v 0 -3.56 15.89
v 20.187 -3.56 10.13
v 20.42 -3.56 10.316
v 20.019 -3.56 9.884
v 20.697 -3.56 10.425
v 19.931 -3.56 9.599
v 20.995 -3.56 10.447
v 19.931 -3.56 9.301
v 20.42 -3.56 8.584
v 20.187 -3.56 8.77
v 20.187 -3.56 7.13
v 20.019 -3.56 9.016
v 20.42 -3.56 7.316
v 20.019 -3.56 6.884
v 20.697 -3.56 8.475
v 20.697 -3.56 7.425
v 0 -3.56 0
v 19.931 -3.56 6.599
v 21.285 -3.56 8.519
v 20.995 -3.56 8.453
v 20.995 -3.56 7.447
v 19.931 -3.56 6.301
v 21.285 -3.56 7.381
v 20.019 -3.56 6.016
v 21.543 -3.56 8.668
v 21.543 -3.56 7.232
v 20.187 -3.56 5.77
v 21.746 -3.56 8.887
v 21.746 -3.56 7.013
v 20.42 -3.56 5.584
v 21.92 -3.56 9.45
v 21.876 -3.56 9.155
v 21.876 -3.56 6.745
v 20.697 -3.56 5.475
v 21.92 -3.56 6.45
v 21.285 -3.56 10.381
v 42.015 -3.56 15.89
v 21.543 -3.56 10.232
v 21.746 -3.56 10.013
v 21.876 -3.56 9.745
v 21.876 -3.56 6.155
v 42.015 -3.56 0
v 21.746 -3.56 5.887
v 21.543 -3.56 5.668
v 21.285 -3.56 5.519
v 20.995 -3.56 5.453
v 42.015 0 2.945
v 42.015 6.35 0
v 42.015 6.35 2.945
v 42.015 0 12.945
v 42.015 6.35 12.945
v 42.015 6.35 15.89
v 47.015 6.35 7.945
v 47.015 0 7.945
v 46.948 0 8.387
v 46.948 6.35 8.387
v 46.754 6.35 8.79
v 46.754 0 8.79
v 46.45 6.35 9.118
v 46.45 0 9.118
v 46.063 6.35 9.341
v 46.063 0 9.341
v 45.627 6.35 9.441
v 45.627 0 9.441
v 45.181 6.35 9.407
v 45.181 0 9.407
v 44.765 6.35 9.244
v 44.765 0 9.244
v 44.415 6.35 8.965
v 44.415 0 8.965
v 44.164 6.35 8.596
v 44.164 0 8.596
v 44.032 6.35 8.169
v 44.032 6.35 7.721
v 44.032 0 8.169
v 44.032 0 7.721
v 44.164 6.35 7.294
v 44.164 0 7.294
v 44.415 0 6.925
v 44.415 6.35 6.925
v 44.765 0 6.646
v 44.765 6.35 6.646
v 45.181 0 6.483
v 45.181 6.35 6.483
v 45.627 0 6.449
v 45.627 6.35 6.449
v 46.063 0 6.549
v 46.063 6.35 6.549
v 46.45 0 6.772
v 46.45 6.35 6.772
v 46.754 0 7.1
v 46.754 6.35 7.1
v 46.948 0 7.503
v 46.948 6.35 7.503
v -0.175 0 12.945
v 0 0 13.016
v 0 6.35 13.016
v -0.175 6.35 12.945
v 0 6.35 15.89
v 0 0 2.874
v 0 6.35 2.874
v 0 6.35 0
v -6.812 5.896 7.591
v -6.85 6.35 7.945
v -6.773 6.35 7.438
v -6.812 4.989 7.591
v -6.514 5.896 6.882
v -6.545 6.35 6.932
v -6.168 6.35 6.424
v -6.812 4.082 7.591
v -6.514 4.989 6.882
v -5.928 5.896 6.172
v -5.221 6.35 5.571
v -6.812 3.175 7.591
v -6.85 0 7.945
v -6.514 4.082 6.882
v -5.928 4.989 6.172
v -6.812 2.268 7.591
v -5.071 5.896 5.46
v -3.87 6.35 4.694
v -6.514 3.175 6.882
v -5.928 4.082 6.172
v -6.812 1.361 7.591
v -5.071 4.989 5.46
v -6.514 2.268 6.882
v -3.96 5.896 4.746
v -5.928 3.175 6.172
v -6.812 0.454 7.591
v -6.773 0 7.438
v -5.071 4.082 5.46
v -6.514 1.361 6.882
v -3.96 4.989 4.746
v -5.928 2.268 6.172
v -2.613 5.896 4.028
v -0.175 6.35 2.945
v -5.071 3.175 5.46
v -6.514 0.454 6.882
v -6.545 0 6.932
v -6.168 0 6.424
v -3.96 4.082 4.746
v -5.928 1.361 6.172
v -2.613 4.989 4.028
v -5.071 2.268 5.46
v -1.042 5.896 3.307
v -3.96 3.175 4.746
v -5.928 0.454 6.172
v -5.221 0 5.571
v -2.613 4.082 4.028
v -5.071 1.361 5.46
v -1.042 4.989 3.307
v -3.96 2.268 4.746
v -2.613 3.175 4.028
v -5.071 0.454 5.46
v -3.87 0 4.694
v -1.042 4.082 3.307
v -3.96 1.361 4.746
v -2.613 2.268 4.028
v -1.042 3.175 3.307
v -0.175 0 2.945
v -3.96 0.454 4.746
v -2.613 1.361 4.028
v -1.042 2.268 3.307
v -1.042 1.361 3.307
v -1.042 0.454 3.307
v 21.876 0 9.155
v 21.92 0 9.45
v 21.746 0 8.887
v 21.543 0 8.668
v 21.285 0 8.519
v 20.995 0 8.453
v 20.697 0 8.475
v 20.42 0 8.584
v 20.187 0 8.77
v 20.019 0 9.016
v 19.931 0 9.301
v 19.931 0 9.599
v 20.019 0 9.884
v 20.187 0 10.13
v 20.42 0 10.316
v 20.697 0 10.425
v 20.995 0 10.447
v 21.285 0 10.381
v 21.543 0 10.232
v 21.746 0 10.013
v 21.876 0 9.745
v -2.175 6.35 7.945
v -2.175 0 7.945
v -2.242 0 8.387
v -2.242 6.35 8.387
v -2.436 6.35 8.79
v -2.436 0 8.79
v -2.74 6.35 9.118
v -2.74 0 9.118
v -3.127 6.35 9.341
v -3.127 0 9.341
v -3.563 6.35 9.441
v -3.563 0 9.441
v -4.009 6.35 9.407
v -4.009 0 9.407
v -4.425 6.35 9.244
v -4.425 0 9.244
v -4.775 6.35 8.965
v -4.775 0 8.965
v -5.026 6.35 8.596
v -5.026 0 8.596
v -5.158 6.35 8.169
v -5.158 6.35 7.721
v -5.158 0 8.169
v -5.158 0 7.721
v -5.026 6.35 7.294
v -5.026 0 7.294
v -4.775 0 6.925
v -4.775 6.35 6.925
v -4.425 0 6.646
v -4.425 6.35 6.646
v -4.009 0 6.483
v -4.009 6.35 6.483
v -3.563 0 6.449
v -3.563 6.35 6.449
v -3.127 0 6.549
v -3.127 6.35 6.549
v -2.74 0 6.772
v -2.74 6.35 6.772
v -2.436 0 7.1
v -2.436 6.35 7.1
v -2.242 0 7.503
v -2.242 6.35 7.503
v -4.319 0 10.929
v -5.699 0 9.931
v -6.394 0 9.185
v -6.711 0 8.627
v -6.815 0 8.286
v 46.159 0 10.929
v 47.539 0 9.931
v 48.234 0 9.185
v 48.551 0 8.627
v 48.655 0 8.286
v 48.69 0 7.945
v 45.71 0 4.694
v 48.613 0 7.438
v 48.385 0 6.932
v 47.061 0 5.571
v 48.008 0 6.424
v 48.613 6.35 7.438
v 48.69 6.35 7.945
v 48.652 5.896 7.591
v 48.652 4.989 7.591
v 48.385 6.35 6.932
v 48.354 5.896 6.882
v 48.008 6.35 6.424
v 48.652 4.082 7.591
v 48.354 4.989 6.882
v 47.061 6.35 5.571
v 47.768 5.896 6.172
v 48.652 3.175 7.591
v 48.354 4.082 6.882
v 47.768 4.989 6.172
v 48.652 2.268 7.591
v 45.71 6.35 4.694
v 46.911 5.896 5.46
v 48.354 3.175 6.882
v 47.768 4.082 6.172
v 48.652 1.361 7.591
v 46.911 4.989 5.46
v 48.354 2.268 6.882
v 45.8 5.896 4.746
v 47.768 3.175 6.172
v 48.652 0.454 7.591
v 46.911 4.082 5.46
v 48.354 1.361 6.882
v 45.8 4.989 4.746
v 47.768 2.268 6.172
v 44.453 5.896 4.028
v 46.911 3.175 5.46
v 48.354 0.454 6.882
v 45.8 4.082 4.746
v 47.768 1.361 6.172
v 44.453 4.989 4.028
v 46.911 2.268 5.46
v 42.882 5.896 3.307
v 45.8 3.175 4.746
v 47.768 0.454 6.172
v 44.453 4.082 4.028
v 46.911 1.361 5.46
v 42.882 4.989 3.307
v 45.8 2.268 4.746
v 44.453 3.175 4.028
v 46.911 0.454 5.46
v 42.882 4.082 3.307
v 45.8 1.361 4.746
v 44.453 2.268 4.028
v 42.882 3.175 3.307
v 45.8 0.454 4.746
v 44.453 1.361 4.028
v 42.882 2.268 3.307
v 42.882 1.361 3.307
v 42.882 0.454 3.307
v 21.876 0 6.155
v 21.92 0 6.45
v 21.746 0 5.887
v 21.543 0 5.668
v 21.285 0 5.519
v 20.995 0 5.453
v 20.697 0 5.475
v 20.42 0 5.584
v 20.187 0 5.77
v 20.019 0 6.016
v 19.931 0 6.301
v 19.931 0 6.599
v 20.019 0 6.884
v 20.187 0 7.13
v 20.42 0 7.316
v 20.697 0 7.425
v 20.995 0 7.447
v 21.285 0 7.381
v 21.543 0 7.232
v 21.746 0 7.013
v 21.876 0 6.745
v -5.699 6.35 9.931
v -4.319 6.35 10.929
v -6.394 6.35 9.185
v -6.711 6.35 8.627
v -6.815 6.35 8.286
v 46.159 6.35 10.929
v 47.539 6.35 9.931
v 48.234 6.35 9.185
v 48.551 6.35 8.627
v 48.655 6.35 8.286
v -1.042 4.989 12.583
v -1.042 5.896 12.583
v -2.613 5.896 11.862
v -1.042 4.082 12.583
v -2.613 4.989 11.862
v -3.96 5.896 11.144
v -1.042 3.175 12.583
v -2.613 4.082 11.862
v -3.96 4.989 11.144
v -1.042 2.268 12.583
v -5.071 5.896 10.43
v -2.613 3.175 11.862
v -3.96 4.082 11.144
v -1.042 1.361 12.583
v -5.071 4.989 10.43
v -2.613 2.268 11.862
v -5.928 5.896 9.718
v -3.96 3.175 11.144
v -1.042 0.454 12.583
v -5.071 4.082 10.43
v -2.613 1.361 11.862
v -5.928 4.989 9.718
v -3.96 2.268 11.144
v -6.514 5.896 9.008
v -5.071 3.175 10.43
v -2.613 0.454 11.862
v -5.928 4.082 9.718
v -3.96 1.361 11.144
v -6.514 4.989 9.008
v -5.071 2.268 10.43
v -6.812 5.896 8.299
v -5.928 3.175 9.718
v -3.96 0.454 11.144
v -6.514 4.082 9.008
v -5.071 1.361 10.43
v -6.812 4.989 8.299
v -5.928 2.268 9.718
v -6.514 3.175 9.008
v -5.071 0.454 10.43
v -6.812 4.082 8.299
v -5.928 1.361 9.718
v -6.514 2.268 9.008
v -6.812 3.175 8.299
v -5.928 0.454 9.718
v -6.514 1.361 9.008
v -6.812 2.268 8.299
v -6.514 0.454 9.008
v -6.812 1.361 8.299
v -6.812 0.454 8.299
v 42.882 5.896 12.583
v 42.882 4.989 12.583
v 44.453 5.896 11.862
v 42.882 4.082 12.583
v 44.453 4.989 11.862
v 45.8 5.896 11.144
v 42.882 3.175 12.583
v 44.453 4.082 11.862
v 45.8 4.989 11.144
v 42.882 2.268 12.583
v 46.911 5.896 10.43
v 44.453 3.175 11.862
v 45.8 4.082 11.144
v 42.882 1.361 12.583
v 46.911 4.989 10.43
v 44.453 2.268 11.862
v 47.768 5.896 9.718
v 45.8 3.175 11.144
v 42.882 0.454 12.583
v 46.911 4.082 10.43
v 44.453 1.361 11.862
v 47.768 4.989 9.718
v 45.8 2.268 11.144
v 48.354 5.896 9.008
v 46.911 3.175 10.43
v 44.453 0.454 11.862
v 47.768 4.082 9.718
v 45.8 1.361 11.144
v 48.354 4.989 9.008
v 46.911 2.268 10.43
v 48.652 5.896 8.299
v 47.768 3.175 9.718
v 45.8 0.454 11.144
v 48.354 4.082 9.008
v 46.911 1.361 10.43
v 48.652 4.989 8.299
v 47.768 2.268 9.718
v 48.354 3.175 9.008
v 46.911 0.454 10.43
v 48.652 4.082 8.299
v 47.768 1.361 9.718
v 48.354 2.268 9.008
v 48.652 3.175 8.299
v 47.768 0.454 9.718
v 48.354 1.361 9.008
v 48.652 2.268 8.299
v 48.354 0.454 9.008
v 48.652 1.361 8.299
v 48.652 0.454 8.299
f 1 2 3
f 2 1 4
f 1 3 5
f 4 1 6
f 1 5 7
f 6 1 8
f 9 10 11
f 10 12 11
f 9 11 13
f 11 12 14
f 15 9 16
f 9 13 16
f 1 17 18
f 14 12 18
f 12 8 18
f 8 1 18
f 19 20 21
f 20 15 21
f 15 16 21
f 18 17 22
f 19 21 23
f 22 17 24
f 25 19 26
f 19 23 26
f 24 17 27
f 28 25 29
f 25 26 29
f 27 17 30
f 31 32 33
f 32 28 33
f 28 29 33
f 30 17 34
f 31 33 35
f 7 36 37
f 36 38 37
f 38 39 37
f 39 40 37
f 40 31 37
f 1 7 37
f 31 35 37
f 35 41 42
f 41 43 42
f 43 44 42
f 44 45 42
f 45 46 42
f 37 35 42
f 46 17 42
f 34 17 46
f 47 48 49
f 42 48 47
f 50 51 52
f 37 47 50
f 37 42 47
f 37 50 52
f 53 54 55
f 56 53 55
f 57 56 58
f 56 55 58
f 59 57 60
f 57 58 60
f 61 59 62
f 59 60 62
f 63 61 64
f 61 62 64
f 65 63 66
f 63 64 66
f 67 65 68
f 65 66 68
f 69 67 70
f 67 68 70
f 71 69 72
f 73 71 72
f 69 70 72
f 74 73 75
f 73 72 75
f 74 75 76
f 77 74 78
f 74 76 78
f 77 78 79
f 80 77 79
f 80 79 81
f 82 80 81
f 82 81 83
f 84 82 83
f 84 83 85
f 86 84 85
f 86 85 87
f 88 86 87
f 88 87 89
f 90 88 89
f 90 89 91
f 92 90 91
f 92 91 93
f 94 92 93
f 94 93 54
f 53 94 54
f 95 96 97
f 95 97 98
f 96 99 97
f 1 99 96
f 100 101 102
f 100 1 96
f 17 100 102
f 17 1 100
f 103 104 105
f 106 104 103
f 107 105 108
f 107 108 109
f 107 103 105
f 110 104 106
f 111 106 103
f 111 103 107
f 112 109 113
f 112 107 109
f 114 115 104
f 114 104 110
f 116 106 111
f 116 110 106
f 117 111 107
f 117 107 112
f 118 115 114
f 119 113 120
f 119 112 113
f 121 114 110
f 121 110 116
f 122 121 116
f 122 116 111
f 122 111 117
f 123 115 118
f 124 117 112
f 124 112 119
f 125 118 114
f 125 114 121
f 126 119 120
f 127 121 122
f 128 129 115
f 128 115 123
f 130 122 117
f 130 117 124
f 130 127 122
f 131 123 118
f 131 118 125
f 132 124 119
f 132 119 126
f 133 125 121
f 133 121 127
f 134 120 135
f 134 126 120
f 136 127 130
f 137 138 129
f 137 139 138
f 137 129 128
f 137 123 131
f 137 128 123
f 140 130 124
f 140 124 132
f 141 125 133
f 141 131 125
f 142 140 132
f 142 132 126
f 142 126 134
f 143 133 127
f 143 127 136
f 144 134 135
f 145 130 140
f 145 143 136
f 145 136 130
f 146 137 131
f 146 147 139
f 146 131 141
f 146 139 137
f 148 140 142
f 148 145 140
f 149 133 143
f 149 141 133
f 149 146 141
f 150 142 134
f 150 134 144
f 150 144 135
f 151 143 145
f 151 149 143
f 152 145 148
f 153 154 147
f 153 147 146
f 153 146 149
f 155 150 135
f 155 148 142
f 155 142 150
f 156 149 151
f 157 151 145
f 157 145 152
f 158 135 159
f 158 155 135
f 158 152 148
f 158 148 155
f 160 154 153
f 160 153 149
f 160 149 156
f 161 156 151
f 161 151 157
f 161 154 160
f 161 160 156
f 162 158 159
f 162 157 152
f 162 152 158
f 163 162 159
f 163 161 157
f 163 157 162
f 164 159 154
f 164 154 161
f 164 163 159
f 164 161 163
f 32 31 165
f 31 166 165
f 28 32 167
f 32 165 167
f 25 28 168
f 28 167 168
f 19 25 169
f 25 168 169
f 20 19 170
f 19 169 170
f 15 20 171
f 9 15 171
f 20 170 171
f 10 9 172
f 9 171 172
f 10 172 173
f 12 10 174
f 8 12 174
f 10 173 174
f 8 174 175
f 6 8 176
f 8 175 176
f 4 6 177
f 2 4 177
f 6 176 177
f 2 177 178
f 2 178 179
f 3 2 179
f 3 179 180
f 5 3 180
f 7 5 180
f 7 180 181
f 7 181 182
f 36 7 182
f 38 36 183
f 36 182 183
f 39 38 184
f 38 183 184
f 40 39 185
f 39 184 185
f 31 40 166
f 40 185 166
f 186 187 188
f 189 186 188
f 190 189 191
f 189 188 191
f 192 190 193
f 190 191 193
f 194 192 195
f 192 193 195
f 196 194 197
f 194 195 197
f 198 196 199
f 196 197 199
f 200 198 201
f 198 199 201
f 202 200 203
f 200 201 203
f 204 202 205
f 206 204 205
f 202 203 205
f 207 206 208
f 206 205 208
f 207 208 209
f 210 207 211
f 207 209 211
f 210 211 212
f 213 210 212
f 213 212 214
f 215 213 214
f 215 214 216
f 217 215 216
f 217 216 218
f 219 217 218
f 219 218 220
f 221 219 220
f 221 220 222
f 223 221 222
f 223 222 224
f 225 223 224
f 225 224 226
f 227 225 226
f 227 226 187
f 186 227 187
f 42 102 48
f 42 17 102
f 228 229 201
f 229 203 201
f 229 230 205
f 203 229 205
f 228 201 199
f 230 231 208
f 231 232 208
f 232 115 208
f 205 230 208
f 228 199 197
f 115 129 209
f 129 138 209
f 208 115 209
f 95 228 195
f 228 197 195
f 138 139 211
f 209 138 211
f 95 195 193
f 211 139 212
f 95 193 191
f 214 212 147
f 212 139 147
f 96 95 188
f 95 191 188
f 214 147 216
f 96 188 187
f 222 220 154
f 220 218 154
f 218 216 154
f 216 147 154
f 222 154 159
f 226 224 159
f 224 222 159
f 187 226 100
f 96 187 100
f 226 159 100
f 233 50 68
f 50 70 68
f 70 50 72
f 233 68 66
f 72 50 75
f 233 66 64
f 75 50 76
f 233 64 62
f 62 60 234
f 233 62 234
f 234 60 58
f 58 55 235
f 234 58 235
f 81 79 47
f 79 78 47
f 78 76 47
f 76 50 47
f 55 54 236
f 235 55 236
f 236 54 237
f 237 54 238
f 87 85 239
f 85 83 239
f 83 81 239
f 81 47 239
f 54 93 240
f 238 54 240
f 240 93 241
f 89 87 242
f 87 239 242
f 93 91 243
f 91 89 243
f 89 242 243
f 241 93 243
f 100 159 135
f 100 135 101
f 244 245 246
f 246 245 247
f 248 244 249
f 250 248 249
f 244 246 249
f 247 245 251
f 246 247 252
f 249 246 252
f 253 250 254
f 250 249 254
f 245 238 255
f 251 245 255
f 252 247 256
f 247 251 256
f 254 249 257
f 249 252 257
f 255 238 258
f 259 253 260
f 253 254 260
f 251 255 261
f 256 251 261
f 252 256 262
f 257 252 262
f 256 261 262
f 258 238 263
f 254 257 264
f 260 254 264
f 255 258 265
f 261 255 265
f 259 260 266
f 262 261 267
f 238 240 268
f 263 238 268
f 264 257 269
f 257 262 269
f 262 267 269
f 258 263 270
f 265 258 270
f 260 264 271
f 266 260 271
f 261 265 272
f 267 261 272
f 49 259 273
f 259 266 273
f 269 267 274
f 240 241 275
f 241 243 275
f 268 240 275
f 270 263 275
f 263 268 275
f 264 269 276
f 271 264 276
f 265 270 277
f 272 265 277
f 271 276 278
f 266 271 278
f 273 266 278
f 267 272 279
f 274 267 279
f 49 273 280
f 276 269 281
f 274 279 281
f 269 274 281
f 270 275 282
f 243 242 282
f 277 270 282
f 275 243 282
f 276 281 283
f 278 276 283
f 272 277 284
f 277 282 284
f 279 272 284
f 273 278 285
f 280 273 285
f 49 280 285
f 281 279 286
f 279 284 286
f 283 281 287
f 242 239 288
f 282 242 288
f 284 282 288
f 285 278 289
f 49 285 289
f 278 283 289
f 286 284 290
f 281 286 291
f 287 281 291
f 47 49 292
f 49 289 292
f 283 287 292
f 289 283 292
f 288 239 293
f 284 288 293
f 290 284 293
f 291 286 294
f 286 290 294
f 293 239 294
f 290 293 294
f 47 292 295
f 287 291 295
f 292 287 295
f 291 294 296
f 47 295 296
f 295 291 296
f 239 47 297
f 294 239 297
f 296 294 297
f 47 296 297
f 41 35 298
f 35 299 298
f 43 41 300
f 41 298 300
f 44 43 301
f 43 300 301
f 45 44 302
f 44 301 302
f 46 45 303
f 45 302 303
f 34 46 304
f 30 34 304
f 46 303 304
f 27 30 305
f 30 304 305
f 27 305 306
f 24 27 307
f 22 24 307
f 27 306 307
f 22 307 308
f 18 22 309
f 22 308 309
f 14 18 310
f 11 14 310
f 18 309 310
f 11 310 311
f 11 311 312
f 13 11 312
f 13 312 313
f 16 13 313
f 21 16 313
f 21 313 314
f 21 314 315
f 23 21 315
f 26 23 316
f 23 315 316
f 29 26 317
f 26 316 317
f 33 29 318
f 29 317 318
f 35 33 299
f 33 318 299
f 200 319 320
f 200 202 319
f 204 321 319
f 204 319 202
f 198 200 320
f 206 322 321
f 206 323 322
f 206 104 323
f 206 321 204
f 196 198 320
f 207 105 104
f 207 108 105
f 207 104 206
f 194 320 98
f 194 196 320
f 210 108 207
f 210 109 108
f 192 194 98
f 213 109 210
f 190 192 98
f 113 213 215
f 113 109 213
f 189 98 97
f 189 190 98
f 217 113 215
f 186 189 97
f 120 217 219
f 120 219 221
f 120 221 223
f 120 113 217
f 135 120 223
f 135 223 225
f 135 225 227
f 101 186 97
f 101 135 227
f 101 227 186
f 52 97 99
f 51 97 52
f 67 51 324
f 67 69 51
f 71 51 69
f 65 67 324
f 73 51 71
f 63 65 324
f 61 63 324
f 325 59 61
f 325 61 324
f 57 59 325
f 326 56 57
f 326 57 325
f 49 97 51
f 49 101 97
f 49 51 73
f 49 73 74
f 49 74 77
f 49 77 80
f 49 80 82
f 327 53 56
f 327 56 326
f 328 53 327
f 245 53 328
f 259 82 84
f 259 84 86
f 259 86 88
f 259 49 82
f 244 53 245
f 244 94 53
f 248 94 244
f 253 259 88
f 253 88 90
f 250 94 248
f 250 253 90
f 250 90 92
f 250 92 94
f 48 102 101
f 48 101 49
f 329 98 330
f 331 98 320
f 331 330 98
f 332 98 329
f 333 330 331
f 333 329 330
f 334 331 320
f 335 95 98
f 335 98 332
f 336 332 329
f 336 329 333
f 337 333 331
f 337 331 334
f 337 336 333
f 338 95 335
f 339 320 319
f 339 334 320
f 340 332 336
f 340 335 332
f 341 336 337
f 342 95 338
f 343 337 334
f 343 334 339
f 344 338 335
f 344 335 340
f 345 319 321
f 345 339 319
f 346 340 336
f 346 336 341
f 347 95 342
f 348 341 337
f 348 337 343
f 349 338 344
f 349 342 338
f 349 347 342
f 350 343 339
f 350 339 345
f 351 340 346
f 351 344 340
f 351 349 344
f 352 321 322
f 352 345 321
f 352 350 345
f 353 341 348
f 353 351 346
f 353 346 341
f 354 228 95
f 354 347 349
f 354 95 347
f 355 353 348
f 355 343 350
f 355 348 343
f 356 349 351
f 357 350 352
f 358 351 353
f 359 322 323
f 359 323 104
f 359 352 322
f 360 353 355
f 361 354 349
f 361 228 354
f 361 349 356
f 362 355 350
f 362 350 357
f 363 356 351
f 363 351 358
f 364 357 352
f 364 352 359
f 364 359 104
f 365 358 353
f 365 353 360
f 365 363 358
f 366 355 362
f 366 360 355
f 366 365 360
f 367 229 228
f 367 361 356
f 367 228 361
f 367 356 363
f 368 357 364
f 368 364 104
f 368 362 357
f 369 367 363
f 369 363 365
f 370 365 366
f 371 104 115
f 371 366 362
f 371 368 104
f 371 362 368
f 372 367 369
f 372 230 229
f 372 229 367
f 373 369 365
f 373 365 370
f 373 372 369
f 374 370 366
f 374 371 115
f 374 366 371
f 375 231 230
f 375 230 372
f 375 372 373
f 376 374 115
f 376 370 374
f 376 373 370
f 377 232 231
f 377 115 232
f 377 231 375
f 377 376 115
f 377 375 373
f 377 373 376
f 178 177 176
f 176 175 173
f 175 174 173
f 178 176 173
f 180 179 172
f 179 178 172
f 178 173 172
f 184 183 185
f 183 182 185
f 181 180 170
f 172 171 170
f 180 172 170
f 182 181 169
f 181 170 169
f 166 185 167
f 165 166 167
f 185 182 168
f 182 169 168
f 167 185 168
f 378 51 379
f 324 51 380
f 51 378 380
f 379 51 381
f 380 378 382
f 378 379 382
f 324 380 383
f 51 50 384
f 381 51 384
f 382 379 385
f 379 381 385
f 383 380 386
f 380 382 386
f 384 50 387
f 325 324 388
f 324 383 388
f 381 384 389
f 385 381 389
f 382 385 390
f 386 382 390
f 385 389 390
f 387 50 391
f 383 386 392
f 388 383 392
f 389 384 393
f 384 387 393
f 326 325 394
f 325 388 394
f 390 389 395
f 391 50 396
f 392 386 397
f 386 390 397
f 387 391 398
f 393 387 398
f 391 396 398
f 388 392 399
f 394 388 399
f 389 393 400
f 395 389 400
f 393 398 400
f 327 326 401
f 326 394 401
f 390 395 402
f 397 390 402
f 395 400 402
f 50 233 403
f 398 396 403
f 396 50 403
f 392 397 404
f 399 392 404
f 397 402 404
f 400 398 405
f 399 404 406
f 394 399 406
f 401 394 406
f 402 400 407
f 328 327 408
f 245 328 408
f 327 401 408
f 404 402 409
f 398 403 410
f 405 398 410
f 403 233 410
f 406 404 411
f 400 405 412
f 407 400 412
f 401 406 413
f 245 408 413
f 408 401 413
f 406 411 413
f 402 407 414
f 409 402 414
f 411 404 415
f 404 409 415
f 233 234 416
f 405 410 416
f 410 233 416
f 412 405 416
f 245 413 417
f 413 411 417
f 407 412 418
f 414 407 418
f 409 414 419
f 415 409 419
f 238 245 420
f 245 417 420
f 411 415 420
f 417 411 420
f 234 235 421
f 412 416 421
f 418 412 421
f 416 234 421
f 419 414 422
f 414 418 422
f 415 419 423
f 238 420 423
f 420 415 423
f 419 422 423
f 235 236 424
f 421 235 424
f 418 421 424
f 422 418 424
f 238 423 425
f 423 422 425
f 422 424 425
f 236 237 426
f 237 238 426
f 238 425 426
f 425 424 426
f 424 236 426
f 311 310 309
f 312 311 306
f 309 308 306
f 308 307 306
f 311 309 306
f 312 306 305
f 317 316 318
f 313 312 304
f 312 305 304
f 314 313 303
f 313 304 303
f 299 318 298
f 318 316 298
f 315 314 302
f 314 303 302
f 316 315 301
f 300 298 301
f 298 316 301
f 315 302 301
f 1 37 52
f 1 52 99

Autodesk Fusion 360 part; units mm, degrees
sketch "Sketch2" plane through (0, 0, 0) normal (0, 1, 0) x (1, 0, 0)
  line L0 (0, 0) -> (42.015, 0)
  line L1 (42.015, 0) -> (42.015, -15.89)
  line L2 (42.015, -15.89) -> (0, -15.89)
  line L3 (0, -15.89) -> (0, 0)
  circle A0 centre (45.515, -7.945) radius 1.5
  line L4 (42.015, -7.945) -> (48.69, -7.945)
  spline S0 degree 5 poles (42.015, -12.945) (42.5156, -12.7419) (43.4745, -12.3366) (44.7863, -11.7309) (46.2763, -10.9278) (47.6689, -9.93) (48.5399, -8.9364) (48.8392, -7.945) (48.5399, -6.9536) (47.6689, -5.96) (46.2763, -4.9622) (44.7863, -4.1591) (43.4745, -3.5534) (42.5156, -3.1481) (42.015, -2.945) knots 0 0 0 0 0 0 0.1 0.2 0.3 0.4 0.5 0.6 0.7 0.8 0.9 1 1 1 1 1 1
  line L5 (20.92, -15.89) -> (20.92, 0)
  spline S1 degree 5 poles (-0.175, -12.945) (-0.6756, -12.7419) (-1.6345, -12.3366) (-2.9463, -11.7309) (-4.4363, -10.9278) (-5.8289, -9.93) (-6.6999, -8.9364) (-6.9992, -7.945) (-6.6999, -6.9536) (-5.8289, -5.96) (-4.4363, -4.9622) (-2.9463, -4.1591) (-1.6345, -3.5534) (-0.6756, -3.1481) (-0.175, -2.945) knots 0 0 0 0 0 0 0.1 0.2 0.3 0.4 0.5 0.6 0.7 0.8 0.9 1 1 1 1 1 1
  line L6 (40.2192, -13.6735) -> (43.8108, -12.2165)
  line L7 (43.8108, -3.6735) -> (40.2192, -2.2165)
  line L8 (1.6208, -13.6735) -> (-1.9708, -12.2165)
  line L9 (-1.9708, -3.6735) -> (1.6208, -2.2165)
  circle A1 centre (-3.675, -7.945) radius 1.5
  line L10 (-0.175, -7.945) -> (-6.85, -7.945)
  circle A2 centre (20.92, -9.45) radius 1
  circle A3 centre (20.92, -6.45) radius 1
  line L11 (-0.175, -12.945) -> (0, -13.016)
  line L12 (-0.175, -7.945) -> (0, -7.945)
  line L13 (-0.175, -2.945) -> (0, -2.874)
  dimension "d2" = 15.89
  dimension "d3" = 3
  dimension "d5" = 3.5
  dimension "d6" = 10
  dimension "d7" = 2.945
  dimension "d8" = 15.89
  dimension "d19" = 2
  dimension "d20" = 2
  dimension "d21" = 3
  dimension "d22" = 6.45
  dimension "d25" = 49.19
  dimension "d26" = 42.19
  dimension "d27" = 55.54
  dimension "d29" = 7.945
extrude "Extrude1" add sketch "Sketch2" along normal blind 6.35 contours L0 L2 L3 L5 A2 A3 | L0 L1 L2 L5 A2 A3 | L3 S1 L9 A1 L10 L12 L13 | L5 A3 | L5 A3 | L3 S1 L8 A1 L10 L11 L12 | L1 A0 L4 S0 | L1 A0 L4 S0 | L5 A2 | L5 A2
extrude "Extrude2" add sketch "Sketch2" against normal blind 3.56 contours L0 L2 L3 L5 A2 A3 | L0 L1 L2 L5 A2 A3 | L5 A3 | L5 A3 | L5 A2 | L5 A2
extrude "Extrude3" cut sketch "Sketch2" against normal blind 25 contours L5 A3 | L5 A3 | L5 A2 | L5 A2
equation "d4 = 6.5 mm"
equation "d5 = d4 - 1.5 mm - d3 / 2"
equation "d7 = ( d8 - d6 ) / 2"
equation "d12 = -9.91 mm + 6.35 mm"
equation "d29 = d2 / 2"
